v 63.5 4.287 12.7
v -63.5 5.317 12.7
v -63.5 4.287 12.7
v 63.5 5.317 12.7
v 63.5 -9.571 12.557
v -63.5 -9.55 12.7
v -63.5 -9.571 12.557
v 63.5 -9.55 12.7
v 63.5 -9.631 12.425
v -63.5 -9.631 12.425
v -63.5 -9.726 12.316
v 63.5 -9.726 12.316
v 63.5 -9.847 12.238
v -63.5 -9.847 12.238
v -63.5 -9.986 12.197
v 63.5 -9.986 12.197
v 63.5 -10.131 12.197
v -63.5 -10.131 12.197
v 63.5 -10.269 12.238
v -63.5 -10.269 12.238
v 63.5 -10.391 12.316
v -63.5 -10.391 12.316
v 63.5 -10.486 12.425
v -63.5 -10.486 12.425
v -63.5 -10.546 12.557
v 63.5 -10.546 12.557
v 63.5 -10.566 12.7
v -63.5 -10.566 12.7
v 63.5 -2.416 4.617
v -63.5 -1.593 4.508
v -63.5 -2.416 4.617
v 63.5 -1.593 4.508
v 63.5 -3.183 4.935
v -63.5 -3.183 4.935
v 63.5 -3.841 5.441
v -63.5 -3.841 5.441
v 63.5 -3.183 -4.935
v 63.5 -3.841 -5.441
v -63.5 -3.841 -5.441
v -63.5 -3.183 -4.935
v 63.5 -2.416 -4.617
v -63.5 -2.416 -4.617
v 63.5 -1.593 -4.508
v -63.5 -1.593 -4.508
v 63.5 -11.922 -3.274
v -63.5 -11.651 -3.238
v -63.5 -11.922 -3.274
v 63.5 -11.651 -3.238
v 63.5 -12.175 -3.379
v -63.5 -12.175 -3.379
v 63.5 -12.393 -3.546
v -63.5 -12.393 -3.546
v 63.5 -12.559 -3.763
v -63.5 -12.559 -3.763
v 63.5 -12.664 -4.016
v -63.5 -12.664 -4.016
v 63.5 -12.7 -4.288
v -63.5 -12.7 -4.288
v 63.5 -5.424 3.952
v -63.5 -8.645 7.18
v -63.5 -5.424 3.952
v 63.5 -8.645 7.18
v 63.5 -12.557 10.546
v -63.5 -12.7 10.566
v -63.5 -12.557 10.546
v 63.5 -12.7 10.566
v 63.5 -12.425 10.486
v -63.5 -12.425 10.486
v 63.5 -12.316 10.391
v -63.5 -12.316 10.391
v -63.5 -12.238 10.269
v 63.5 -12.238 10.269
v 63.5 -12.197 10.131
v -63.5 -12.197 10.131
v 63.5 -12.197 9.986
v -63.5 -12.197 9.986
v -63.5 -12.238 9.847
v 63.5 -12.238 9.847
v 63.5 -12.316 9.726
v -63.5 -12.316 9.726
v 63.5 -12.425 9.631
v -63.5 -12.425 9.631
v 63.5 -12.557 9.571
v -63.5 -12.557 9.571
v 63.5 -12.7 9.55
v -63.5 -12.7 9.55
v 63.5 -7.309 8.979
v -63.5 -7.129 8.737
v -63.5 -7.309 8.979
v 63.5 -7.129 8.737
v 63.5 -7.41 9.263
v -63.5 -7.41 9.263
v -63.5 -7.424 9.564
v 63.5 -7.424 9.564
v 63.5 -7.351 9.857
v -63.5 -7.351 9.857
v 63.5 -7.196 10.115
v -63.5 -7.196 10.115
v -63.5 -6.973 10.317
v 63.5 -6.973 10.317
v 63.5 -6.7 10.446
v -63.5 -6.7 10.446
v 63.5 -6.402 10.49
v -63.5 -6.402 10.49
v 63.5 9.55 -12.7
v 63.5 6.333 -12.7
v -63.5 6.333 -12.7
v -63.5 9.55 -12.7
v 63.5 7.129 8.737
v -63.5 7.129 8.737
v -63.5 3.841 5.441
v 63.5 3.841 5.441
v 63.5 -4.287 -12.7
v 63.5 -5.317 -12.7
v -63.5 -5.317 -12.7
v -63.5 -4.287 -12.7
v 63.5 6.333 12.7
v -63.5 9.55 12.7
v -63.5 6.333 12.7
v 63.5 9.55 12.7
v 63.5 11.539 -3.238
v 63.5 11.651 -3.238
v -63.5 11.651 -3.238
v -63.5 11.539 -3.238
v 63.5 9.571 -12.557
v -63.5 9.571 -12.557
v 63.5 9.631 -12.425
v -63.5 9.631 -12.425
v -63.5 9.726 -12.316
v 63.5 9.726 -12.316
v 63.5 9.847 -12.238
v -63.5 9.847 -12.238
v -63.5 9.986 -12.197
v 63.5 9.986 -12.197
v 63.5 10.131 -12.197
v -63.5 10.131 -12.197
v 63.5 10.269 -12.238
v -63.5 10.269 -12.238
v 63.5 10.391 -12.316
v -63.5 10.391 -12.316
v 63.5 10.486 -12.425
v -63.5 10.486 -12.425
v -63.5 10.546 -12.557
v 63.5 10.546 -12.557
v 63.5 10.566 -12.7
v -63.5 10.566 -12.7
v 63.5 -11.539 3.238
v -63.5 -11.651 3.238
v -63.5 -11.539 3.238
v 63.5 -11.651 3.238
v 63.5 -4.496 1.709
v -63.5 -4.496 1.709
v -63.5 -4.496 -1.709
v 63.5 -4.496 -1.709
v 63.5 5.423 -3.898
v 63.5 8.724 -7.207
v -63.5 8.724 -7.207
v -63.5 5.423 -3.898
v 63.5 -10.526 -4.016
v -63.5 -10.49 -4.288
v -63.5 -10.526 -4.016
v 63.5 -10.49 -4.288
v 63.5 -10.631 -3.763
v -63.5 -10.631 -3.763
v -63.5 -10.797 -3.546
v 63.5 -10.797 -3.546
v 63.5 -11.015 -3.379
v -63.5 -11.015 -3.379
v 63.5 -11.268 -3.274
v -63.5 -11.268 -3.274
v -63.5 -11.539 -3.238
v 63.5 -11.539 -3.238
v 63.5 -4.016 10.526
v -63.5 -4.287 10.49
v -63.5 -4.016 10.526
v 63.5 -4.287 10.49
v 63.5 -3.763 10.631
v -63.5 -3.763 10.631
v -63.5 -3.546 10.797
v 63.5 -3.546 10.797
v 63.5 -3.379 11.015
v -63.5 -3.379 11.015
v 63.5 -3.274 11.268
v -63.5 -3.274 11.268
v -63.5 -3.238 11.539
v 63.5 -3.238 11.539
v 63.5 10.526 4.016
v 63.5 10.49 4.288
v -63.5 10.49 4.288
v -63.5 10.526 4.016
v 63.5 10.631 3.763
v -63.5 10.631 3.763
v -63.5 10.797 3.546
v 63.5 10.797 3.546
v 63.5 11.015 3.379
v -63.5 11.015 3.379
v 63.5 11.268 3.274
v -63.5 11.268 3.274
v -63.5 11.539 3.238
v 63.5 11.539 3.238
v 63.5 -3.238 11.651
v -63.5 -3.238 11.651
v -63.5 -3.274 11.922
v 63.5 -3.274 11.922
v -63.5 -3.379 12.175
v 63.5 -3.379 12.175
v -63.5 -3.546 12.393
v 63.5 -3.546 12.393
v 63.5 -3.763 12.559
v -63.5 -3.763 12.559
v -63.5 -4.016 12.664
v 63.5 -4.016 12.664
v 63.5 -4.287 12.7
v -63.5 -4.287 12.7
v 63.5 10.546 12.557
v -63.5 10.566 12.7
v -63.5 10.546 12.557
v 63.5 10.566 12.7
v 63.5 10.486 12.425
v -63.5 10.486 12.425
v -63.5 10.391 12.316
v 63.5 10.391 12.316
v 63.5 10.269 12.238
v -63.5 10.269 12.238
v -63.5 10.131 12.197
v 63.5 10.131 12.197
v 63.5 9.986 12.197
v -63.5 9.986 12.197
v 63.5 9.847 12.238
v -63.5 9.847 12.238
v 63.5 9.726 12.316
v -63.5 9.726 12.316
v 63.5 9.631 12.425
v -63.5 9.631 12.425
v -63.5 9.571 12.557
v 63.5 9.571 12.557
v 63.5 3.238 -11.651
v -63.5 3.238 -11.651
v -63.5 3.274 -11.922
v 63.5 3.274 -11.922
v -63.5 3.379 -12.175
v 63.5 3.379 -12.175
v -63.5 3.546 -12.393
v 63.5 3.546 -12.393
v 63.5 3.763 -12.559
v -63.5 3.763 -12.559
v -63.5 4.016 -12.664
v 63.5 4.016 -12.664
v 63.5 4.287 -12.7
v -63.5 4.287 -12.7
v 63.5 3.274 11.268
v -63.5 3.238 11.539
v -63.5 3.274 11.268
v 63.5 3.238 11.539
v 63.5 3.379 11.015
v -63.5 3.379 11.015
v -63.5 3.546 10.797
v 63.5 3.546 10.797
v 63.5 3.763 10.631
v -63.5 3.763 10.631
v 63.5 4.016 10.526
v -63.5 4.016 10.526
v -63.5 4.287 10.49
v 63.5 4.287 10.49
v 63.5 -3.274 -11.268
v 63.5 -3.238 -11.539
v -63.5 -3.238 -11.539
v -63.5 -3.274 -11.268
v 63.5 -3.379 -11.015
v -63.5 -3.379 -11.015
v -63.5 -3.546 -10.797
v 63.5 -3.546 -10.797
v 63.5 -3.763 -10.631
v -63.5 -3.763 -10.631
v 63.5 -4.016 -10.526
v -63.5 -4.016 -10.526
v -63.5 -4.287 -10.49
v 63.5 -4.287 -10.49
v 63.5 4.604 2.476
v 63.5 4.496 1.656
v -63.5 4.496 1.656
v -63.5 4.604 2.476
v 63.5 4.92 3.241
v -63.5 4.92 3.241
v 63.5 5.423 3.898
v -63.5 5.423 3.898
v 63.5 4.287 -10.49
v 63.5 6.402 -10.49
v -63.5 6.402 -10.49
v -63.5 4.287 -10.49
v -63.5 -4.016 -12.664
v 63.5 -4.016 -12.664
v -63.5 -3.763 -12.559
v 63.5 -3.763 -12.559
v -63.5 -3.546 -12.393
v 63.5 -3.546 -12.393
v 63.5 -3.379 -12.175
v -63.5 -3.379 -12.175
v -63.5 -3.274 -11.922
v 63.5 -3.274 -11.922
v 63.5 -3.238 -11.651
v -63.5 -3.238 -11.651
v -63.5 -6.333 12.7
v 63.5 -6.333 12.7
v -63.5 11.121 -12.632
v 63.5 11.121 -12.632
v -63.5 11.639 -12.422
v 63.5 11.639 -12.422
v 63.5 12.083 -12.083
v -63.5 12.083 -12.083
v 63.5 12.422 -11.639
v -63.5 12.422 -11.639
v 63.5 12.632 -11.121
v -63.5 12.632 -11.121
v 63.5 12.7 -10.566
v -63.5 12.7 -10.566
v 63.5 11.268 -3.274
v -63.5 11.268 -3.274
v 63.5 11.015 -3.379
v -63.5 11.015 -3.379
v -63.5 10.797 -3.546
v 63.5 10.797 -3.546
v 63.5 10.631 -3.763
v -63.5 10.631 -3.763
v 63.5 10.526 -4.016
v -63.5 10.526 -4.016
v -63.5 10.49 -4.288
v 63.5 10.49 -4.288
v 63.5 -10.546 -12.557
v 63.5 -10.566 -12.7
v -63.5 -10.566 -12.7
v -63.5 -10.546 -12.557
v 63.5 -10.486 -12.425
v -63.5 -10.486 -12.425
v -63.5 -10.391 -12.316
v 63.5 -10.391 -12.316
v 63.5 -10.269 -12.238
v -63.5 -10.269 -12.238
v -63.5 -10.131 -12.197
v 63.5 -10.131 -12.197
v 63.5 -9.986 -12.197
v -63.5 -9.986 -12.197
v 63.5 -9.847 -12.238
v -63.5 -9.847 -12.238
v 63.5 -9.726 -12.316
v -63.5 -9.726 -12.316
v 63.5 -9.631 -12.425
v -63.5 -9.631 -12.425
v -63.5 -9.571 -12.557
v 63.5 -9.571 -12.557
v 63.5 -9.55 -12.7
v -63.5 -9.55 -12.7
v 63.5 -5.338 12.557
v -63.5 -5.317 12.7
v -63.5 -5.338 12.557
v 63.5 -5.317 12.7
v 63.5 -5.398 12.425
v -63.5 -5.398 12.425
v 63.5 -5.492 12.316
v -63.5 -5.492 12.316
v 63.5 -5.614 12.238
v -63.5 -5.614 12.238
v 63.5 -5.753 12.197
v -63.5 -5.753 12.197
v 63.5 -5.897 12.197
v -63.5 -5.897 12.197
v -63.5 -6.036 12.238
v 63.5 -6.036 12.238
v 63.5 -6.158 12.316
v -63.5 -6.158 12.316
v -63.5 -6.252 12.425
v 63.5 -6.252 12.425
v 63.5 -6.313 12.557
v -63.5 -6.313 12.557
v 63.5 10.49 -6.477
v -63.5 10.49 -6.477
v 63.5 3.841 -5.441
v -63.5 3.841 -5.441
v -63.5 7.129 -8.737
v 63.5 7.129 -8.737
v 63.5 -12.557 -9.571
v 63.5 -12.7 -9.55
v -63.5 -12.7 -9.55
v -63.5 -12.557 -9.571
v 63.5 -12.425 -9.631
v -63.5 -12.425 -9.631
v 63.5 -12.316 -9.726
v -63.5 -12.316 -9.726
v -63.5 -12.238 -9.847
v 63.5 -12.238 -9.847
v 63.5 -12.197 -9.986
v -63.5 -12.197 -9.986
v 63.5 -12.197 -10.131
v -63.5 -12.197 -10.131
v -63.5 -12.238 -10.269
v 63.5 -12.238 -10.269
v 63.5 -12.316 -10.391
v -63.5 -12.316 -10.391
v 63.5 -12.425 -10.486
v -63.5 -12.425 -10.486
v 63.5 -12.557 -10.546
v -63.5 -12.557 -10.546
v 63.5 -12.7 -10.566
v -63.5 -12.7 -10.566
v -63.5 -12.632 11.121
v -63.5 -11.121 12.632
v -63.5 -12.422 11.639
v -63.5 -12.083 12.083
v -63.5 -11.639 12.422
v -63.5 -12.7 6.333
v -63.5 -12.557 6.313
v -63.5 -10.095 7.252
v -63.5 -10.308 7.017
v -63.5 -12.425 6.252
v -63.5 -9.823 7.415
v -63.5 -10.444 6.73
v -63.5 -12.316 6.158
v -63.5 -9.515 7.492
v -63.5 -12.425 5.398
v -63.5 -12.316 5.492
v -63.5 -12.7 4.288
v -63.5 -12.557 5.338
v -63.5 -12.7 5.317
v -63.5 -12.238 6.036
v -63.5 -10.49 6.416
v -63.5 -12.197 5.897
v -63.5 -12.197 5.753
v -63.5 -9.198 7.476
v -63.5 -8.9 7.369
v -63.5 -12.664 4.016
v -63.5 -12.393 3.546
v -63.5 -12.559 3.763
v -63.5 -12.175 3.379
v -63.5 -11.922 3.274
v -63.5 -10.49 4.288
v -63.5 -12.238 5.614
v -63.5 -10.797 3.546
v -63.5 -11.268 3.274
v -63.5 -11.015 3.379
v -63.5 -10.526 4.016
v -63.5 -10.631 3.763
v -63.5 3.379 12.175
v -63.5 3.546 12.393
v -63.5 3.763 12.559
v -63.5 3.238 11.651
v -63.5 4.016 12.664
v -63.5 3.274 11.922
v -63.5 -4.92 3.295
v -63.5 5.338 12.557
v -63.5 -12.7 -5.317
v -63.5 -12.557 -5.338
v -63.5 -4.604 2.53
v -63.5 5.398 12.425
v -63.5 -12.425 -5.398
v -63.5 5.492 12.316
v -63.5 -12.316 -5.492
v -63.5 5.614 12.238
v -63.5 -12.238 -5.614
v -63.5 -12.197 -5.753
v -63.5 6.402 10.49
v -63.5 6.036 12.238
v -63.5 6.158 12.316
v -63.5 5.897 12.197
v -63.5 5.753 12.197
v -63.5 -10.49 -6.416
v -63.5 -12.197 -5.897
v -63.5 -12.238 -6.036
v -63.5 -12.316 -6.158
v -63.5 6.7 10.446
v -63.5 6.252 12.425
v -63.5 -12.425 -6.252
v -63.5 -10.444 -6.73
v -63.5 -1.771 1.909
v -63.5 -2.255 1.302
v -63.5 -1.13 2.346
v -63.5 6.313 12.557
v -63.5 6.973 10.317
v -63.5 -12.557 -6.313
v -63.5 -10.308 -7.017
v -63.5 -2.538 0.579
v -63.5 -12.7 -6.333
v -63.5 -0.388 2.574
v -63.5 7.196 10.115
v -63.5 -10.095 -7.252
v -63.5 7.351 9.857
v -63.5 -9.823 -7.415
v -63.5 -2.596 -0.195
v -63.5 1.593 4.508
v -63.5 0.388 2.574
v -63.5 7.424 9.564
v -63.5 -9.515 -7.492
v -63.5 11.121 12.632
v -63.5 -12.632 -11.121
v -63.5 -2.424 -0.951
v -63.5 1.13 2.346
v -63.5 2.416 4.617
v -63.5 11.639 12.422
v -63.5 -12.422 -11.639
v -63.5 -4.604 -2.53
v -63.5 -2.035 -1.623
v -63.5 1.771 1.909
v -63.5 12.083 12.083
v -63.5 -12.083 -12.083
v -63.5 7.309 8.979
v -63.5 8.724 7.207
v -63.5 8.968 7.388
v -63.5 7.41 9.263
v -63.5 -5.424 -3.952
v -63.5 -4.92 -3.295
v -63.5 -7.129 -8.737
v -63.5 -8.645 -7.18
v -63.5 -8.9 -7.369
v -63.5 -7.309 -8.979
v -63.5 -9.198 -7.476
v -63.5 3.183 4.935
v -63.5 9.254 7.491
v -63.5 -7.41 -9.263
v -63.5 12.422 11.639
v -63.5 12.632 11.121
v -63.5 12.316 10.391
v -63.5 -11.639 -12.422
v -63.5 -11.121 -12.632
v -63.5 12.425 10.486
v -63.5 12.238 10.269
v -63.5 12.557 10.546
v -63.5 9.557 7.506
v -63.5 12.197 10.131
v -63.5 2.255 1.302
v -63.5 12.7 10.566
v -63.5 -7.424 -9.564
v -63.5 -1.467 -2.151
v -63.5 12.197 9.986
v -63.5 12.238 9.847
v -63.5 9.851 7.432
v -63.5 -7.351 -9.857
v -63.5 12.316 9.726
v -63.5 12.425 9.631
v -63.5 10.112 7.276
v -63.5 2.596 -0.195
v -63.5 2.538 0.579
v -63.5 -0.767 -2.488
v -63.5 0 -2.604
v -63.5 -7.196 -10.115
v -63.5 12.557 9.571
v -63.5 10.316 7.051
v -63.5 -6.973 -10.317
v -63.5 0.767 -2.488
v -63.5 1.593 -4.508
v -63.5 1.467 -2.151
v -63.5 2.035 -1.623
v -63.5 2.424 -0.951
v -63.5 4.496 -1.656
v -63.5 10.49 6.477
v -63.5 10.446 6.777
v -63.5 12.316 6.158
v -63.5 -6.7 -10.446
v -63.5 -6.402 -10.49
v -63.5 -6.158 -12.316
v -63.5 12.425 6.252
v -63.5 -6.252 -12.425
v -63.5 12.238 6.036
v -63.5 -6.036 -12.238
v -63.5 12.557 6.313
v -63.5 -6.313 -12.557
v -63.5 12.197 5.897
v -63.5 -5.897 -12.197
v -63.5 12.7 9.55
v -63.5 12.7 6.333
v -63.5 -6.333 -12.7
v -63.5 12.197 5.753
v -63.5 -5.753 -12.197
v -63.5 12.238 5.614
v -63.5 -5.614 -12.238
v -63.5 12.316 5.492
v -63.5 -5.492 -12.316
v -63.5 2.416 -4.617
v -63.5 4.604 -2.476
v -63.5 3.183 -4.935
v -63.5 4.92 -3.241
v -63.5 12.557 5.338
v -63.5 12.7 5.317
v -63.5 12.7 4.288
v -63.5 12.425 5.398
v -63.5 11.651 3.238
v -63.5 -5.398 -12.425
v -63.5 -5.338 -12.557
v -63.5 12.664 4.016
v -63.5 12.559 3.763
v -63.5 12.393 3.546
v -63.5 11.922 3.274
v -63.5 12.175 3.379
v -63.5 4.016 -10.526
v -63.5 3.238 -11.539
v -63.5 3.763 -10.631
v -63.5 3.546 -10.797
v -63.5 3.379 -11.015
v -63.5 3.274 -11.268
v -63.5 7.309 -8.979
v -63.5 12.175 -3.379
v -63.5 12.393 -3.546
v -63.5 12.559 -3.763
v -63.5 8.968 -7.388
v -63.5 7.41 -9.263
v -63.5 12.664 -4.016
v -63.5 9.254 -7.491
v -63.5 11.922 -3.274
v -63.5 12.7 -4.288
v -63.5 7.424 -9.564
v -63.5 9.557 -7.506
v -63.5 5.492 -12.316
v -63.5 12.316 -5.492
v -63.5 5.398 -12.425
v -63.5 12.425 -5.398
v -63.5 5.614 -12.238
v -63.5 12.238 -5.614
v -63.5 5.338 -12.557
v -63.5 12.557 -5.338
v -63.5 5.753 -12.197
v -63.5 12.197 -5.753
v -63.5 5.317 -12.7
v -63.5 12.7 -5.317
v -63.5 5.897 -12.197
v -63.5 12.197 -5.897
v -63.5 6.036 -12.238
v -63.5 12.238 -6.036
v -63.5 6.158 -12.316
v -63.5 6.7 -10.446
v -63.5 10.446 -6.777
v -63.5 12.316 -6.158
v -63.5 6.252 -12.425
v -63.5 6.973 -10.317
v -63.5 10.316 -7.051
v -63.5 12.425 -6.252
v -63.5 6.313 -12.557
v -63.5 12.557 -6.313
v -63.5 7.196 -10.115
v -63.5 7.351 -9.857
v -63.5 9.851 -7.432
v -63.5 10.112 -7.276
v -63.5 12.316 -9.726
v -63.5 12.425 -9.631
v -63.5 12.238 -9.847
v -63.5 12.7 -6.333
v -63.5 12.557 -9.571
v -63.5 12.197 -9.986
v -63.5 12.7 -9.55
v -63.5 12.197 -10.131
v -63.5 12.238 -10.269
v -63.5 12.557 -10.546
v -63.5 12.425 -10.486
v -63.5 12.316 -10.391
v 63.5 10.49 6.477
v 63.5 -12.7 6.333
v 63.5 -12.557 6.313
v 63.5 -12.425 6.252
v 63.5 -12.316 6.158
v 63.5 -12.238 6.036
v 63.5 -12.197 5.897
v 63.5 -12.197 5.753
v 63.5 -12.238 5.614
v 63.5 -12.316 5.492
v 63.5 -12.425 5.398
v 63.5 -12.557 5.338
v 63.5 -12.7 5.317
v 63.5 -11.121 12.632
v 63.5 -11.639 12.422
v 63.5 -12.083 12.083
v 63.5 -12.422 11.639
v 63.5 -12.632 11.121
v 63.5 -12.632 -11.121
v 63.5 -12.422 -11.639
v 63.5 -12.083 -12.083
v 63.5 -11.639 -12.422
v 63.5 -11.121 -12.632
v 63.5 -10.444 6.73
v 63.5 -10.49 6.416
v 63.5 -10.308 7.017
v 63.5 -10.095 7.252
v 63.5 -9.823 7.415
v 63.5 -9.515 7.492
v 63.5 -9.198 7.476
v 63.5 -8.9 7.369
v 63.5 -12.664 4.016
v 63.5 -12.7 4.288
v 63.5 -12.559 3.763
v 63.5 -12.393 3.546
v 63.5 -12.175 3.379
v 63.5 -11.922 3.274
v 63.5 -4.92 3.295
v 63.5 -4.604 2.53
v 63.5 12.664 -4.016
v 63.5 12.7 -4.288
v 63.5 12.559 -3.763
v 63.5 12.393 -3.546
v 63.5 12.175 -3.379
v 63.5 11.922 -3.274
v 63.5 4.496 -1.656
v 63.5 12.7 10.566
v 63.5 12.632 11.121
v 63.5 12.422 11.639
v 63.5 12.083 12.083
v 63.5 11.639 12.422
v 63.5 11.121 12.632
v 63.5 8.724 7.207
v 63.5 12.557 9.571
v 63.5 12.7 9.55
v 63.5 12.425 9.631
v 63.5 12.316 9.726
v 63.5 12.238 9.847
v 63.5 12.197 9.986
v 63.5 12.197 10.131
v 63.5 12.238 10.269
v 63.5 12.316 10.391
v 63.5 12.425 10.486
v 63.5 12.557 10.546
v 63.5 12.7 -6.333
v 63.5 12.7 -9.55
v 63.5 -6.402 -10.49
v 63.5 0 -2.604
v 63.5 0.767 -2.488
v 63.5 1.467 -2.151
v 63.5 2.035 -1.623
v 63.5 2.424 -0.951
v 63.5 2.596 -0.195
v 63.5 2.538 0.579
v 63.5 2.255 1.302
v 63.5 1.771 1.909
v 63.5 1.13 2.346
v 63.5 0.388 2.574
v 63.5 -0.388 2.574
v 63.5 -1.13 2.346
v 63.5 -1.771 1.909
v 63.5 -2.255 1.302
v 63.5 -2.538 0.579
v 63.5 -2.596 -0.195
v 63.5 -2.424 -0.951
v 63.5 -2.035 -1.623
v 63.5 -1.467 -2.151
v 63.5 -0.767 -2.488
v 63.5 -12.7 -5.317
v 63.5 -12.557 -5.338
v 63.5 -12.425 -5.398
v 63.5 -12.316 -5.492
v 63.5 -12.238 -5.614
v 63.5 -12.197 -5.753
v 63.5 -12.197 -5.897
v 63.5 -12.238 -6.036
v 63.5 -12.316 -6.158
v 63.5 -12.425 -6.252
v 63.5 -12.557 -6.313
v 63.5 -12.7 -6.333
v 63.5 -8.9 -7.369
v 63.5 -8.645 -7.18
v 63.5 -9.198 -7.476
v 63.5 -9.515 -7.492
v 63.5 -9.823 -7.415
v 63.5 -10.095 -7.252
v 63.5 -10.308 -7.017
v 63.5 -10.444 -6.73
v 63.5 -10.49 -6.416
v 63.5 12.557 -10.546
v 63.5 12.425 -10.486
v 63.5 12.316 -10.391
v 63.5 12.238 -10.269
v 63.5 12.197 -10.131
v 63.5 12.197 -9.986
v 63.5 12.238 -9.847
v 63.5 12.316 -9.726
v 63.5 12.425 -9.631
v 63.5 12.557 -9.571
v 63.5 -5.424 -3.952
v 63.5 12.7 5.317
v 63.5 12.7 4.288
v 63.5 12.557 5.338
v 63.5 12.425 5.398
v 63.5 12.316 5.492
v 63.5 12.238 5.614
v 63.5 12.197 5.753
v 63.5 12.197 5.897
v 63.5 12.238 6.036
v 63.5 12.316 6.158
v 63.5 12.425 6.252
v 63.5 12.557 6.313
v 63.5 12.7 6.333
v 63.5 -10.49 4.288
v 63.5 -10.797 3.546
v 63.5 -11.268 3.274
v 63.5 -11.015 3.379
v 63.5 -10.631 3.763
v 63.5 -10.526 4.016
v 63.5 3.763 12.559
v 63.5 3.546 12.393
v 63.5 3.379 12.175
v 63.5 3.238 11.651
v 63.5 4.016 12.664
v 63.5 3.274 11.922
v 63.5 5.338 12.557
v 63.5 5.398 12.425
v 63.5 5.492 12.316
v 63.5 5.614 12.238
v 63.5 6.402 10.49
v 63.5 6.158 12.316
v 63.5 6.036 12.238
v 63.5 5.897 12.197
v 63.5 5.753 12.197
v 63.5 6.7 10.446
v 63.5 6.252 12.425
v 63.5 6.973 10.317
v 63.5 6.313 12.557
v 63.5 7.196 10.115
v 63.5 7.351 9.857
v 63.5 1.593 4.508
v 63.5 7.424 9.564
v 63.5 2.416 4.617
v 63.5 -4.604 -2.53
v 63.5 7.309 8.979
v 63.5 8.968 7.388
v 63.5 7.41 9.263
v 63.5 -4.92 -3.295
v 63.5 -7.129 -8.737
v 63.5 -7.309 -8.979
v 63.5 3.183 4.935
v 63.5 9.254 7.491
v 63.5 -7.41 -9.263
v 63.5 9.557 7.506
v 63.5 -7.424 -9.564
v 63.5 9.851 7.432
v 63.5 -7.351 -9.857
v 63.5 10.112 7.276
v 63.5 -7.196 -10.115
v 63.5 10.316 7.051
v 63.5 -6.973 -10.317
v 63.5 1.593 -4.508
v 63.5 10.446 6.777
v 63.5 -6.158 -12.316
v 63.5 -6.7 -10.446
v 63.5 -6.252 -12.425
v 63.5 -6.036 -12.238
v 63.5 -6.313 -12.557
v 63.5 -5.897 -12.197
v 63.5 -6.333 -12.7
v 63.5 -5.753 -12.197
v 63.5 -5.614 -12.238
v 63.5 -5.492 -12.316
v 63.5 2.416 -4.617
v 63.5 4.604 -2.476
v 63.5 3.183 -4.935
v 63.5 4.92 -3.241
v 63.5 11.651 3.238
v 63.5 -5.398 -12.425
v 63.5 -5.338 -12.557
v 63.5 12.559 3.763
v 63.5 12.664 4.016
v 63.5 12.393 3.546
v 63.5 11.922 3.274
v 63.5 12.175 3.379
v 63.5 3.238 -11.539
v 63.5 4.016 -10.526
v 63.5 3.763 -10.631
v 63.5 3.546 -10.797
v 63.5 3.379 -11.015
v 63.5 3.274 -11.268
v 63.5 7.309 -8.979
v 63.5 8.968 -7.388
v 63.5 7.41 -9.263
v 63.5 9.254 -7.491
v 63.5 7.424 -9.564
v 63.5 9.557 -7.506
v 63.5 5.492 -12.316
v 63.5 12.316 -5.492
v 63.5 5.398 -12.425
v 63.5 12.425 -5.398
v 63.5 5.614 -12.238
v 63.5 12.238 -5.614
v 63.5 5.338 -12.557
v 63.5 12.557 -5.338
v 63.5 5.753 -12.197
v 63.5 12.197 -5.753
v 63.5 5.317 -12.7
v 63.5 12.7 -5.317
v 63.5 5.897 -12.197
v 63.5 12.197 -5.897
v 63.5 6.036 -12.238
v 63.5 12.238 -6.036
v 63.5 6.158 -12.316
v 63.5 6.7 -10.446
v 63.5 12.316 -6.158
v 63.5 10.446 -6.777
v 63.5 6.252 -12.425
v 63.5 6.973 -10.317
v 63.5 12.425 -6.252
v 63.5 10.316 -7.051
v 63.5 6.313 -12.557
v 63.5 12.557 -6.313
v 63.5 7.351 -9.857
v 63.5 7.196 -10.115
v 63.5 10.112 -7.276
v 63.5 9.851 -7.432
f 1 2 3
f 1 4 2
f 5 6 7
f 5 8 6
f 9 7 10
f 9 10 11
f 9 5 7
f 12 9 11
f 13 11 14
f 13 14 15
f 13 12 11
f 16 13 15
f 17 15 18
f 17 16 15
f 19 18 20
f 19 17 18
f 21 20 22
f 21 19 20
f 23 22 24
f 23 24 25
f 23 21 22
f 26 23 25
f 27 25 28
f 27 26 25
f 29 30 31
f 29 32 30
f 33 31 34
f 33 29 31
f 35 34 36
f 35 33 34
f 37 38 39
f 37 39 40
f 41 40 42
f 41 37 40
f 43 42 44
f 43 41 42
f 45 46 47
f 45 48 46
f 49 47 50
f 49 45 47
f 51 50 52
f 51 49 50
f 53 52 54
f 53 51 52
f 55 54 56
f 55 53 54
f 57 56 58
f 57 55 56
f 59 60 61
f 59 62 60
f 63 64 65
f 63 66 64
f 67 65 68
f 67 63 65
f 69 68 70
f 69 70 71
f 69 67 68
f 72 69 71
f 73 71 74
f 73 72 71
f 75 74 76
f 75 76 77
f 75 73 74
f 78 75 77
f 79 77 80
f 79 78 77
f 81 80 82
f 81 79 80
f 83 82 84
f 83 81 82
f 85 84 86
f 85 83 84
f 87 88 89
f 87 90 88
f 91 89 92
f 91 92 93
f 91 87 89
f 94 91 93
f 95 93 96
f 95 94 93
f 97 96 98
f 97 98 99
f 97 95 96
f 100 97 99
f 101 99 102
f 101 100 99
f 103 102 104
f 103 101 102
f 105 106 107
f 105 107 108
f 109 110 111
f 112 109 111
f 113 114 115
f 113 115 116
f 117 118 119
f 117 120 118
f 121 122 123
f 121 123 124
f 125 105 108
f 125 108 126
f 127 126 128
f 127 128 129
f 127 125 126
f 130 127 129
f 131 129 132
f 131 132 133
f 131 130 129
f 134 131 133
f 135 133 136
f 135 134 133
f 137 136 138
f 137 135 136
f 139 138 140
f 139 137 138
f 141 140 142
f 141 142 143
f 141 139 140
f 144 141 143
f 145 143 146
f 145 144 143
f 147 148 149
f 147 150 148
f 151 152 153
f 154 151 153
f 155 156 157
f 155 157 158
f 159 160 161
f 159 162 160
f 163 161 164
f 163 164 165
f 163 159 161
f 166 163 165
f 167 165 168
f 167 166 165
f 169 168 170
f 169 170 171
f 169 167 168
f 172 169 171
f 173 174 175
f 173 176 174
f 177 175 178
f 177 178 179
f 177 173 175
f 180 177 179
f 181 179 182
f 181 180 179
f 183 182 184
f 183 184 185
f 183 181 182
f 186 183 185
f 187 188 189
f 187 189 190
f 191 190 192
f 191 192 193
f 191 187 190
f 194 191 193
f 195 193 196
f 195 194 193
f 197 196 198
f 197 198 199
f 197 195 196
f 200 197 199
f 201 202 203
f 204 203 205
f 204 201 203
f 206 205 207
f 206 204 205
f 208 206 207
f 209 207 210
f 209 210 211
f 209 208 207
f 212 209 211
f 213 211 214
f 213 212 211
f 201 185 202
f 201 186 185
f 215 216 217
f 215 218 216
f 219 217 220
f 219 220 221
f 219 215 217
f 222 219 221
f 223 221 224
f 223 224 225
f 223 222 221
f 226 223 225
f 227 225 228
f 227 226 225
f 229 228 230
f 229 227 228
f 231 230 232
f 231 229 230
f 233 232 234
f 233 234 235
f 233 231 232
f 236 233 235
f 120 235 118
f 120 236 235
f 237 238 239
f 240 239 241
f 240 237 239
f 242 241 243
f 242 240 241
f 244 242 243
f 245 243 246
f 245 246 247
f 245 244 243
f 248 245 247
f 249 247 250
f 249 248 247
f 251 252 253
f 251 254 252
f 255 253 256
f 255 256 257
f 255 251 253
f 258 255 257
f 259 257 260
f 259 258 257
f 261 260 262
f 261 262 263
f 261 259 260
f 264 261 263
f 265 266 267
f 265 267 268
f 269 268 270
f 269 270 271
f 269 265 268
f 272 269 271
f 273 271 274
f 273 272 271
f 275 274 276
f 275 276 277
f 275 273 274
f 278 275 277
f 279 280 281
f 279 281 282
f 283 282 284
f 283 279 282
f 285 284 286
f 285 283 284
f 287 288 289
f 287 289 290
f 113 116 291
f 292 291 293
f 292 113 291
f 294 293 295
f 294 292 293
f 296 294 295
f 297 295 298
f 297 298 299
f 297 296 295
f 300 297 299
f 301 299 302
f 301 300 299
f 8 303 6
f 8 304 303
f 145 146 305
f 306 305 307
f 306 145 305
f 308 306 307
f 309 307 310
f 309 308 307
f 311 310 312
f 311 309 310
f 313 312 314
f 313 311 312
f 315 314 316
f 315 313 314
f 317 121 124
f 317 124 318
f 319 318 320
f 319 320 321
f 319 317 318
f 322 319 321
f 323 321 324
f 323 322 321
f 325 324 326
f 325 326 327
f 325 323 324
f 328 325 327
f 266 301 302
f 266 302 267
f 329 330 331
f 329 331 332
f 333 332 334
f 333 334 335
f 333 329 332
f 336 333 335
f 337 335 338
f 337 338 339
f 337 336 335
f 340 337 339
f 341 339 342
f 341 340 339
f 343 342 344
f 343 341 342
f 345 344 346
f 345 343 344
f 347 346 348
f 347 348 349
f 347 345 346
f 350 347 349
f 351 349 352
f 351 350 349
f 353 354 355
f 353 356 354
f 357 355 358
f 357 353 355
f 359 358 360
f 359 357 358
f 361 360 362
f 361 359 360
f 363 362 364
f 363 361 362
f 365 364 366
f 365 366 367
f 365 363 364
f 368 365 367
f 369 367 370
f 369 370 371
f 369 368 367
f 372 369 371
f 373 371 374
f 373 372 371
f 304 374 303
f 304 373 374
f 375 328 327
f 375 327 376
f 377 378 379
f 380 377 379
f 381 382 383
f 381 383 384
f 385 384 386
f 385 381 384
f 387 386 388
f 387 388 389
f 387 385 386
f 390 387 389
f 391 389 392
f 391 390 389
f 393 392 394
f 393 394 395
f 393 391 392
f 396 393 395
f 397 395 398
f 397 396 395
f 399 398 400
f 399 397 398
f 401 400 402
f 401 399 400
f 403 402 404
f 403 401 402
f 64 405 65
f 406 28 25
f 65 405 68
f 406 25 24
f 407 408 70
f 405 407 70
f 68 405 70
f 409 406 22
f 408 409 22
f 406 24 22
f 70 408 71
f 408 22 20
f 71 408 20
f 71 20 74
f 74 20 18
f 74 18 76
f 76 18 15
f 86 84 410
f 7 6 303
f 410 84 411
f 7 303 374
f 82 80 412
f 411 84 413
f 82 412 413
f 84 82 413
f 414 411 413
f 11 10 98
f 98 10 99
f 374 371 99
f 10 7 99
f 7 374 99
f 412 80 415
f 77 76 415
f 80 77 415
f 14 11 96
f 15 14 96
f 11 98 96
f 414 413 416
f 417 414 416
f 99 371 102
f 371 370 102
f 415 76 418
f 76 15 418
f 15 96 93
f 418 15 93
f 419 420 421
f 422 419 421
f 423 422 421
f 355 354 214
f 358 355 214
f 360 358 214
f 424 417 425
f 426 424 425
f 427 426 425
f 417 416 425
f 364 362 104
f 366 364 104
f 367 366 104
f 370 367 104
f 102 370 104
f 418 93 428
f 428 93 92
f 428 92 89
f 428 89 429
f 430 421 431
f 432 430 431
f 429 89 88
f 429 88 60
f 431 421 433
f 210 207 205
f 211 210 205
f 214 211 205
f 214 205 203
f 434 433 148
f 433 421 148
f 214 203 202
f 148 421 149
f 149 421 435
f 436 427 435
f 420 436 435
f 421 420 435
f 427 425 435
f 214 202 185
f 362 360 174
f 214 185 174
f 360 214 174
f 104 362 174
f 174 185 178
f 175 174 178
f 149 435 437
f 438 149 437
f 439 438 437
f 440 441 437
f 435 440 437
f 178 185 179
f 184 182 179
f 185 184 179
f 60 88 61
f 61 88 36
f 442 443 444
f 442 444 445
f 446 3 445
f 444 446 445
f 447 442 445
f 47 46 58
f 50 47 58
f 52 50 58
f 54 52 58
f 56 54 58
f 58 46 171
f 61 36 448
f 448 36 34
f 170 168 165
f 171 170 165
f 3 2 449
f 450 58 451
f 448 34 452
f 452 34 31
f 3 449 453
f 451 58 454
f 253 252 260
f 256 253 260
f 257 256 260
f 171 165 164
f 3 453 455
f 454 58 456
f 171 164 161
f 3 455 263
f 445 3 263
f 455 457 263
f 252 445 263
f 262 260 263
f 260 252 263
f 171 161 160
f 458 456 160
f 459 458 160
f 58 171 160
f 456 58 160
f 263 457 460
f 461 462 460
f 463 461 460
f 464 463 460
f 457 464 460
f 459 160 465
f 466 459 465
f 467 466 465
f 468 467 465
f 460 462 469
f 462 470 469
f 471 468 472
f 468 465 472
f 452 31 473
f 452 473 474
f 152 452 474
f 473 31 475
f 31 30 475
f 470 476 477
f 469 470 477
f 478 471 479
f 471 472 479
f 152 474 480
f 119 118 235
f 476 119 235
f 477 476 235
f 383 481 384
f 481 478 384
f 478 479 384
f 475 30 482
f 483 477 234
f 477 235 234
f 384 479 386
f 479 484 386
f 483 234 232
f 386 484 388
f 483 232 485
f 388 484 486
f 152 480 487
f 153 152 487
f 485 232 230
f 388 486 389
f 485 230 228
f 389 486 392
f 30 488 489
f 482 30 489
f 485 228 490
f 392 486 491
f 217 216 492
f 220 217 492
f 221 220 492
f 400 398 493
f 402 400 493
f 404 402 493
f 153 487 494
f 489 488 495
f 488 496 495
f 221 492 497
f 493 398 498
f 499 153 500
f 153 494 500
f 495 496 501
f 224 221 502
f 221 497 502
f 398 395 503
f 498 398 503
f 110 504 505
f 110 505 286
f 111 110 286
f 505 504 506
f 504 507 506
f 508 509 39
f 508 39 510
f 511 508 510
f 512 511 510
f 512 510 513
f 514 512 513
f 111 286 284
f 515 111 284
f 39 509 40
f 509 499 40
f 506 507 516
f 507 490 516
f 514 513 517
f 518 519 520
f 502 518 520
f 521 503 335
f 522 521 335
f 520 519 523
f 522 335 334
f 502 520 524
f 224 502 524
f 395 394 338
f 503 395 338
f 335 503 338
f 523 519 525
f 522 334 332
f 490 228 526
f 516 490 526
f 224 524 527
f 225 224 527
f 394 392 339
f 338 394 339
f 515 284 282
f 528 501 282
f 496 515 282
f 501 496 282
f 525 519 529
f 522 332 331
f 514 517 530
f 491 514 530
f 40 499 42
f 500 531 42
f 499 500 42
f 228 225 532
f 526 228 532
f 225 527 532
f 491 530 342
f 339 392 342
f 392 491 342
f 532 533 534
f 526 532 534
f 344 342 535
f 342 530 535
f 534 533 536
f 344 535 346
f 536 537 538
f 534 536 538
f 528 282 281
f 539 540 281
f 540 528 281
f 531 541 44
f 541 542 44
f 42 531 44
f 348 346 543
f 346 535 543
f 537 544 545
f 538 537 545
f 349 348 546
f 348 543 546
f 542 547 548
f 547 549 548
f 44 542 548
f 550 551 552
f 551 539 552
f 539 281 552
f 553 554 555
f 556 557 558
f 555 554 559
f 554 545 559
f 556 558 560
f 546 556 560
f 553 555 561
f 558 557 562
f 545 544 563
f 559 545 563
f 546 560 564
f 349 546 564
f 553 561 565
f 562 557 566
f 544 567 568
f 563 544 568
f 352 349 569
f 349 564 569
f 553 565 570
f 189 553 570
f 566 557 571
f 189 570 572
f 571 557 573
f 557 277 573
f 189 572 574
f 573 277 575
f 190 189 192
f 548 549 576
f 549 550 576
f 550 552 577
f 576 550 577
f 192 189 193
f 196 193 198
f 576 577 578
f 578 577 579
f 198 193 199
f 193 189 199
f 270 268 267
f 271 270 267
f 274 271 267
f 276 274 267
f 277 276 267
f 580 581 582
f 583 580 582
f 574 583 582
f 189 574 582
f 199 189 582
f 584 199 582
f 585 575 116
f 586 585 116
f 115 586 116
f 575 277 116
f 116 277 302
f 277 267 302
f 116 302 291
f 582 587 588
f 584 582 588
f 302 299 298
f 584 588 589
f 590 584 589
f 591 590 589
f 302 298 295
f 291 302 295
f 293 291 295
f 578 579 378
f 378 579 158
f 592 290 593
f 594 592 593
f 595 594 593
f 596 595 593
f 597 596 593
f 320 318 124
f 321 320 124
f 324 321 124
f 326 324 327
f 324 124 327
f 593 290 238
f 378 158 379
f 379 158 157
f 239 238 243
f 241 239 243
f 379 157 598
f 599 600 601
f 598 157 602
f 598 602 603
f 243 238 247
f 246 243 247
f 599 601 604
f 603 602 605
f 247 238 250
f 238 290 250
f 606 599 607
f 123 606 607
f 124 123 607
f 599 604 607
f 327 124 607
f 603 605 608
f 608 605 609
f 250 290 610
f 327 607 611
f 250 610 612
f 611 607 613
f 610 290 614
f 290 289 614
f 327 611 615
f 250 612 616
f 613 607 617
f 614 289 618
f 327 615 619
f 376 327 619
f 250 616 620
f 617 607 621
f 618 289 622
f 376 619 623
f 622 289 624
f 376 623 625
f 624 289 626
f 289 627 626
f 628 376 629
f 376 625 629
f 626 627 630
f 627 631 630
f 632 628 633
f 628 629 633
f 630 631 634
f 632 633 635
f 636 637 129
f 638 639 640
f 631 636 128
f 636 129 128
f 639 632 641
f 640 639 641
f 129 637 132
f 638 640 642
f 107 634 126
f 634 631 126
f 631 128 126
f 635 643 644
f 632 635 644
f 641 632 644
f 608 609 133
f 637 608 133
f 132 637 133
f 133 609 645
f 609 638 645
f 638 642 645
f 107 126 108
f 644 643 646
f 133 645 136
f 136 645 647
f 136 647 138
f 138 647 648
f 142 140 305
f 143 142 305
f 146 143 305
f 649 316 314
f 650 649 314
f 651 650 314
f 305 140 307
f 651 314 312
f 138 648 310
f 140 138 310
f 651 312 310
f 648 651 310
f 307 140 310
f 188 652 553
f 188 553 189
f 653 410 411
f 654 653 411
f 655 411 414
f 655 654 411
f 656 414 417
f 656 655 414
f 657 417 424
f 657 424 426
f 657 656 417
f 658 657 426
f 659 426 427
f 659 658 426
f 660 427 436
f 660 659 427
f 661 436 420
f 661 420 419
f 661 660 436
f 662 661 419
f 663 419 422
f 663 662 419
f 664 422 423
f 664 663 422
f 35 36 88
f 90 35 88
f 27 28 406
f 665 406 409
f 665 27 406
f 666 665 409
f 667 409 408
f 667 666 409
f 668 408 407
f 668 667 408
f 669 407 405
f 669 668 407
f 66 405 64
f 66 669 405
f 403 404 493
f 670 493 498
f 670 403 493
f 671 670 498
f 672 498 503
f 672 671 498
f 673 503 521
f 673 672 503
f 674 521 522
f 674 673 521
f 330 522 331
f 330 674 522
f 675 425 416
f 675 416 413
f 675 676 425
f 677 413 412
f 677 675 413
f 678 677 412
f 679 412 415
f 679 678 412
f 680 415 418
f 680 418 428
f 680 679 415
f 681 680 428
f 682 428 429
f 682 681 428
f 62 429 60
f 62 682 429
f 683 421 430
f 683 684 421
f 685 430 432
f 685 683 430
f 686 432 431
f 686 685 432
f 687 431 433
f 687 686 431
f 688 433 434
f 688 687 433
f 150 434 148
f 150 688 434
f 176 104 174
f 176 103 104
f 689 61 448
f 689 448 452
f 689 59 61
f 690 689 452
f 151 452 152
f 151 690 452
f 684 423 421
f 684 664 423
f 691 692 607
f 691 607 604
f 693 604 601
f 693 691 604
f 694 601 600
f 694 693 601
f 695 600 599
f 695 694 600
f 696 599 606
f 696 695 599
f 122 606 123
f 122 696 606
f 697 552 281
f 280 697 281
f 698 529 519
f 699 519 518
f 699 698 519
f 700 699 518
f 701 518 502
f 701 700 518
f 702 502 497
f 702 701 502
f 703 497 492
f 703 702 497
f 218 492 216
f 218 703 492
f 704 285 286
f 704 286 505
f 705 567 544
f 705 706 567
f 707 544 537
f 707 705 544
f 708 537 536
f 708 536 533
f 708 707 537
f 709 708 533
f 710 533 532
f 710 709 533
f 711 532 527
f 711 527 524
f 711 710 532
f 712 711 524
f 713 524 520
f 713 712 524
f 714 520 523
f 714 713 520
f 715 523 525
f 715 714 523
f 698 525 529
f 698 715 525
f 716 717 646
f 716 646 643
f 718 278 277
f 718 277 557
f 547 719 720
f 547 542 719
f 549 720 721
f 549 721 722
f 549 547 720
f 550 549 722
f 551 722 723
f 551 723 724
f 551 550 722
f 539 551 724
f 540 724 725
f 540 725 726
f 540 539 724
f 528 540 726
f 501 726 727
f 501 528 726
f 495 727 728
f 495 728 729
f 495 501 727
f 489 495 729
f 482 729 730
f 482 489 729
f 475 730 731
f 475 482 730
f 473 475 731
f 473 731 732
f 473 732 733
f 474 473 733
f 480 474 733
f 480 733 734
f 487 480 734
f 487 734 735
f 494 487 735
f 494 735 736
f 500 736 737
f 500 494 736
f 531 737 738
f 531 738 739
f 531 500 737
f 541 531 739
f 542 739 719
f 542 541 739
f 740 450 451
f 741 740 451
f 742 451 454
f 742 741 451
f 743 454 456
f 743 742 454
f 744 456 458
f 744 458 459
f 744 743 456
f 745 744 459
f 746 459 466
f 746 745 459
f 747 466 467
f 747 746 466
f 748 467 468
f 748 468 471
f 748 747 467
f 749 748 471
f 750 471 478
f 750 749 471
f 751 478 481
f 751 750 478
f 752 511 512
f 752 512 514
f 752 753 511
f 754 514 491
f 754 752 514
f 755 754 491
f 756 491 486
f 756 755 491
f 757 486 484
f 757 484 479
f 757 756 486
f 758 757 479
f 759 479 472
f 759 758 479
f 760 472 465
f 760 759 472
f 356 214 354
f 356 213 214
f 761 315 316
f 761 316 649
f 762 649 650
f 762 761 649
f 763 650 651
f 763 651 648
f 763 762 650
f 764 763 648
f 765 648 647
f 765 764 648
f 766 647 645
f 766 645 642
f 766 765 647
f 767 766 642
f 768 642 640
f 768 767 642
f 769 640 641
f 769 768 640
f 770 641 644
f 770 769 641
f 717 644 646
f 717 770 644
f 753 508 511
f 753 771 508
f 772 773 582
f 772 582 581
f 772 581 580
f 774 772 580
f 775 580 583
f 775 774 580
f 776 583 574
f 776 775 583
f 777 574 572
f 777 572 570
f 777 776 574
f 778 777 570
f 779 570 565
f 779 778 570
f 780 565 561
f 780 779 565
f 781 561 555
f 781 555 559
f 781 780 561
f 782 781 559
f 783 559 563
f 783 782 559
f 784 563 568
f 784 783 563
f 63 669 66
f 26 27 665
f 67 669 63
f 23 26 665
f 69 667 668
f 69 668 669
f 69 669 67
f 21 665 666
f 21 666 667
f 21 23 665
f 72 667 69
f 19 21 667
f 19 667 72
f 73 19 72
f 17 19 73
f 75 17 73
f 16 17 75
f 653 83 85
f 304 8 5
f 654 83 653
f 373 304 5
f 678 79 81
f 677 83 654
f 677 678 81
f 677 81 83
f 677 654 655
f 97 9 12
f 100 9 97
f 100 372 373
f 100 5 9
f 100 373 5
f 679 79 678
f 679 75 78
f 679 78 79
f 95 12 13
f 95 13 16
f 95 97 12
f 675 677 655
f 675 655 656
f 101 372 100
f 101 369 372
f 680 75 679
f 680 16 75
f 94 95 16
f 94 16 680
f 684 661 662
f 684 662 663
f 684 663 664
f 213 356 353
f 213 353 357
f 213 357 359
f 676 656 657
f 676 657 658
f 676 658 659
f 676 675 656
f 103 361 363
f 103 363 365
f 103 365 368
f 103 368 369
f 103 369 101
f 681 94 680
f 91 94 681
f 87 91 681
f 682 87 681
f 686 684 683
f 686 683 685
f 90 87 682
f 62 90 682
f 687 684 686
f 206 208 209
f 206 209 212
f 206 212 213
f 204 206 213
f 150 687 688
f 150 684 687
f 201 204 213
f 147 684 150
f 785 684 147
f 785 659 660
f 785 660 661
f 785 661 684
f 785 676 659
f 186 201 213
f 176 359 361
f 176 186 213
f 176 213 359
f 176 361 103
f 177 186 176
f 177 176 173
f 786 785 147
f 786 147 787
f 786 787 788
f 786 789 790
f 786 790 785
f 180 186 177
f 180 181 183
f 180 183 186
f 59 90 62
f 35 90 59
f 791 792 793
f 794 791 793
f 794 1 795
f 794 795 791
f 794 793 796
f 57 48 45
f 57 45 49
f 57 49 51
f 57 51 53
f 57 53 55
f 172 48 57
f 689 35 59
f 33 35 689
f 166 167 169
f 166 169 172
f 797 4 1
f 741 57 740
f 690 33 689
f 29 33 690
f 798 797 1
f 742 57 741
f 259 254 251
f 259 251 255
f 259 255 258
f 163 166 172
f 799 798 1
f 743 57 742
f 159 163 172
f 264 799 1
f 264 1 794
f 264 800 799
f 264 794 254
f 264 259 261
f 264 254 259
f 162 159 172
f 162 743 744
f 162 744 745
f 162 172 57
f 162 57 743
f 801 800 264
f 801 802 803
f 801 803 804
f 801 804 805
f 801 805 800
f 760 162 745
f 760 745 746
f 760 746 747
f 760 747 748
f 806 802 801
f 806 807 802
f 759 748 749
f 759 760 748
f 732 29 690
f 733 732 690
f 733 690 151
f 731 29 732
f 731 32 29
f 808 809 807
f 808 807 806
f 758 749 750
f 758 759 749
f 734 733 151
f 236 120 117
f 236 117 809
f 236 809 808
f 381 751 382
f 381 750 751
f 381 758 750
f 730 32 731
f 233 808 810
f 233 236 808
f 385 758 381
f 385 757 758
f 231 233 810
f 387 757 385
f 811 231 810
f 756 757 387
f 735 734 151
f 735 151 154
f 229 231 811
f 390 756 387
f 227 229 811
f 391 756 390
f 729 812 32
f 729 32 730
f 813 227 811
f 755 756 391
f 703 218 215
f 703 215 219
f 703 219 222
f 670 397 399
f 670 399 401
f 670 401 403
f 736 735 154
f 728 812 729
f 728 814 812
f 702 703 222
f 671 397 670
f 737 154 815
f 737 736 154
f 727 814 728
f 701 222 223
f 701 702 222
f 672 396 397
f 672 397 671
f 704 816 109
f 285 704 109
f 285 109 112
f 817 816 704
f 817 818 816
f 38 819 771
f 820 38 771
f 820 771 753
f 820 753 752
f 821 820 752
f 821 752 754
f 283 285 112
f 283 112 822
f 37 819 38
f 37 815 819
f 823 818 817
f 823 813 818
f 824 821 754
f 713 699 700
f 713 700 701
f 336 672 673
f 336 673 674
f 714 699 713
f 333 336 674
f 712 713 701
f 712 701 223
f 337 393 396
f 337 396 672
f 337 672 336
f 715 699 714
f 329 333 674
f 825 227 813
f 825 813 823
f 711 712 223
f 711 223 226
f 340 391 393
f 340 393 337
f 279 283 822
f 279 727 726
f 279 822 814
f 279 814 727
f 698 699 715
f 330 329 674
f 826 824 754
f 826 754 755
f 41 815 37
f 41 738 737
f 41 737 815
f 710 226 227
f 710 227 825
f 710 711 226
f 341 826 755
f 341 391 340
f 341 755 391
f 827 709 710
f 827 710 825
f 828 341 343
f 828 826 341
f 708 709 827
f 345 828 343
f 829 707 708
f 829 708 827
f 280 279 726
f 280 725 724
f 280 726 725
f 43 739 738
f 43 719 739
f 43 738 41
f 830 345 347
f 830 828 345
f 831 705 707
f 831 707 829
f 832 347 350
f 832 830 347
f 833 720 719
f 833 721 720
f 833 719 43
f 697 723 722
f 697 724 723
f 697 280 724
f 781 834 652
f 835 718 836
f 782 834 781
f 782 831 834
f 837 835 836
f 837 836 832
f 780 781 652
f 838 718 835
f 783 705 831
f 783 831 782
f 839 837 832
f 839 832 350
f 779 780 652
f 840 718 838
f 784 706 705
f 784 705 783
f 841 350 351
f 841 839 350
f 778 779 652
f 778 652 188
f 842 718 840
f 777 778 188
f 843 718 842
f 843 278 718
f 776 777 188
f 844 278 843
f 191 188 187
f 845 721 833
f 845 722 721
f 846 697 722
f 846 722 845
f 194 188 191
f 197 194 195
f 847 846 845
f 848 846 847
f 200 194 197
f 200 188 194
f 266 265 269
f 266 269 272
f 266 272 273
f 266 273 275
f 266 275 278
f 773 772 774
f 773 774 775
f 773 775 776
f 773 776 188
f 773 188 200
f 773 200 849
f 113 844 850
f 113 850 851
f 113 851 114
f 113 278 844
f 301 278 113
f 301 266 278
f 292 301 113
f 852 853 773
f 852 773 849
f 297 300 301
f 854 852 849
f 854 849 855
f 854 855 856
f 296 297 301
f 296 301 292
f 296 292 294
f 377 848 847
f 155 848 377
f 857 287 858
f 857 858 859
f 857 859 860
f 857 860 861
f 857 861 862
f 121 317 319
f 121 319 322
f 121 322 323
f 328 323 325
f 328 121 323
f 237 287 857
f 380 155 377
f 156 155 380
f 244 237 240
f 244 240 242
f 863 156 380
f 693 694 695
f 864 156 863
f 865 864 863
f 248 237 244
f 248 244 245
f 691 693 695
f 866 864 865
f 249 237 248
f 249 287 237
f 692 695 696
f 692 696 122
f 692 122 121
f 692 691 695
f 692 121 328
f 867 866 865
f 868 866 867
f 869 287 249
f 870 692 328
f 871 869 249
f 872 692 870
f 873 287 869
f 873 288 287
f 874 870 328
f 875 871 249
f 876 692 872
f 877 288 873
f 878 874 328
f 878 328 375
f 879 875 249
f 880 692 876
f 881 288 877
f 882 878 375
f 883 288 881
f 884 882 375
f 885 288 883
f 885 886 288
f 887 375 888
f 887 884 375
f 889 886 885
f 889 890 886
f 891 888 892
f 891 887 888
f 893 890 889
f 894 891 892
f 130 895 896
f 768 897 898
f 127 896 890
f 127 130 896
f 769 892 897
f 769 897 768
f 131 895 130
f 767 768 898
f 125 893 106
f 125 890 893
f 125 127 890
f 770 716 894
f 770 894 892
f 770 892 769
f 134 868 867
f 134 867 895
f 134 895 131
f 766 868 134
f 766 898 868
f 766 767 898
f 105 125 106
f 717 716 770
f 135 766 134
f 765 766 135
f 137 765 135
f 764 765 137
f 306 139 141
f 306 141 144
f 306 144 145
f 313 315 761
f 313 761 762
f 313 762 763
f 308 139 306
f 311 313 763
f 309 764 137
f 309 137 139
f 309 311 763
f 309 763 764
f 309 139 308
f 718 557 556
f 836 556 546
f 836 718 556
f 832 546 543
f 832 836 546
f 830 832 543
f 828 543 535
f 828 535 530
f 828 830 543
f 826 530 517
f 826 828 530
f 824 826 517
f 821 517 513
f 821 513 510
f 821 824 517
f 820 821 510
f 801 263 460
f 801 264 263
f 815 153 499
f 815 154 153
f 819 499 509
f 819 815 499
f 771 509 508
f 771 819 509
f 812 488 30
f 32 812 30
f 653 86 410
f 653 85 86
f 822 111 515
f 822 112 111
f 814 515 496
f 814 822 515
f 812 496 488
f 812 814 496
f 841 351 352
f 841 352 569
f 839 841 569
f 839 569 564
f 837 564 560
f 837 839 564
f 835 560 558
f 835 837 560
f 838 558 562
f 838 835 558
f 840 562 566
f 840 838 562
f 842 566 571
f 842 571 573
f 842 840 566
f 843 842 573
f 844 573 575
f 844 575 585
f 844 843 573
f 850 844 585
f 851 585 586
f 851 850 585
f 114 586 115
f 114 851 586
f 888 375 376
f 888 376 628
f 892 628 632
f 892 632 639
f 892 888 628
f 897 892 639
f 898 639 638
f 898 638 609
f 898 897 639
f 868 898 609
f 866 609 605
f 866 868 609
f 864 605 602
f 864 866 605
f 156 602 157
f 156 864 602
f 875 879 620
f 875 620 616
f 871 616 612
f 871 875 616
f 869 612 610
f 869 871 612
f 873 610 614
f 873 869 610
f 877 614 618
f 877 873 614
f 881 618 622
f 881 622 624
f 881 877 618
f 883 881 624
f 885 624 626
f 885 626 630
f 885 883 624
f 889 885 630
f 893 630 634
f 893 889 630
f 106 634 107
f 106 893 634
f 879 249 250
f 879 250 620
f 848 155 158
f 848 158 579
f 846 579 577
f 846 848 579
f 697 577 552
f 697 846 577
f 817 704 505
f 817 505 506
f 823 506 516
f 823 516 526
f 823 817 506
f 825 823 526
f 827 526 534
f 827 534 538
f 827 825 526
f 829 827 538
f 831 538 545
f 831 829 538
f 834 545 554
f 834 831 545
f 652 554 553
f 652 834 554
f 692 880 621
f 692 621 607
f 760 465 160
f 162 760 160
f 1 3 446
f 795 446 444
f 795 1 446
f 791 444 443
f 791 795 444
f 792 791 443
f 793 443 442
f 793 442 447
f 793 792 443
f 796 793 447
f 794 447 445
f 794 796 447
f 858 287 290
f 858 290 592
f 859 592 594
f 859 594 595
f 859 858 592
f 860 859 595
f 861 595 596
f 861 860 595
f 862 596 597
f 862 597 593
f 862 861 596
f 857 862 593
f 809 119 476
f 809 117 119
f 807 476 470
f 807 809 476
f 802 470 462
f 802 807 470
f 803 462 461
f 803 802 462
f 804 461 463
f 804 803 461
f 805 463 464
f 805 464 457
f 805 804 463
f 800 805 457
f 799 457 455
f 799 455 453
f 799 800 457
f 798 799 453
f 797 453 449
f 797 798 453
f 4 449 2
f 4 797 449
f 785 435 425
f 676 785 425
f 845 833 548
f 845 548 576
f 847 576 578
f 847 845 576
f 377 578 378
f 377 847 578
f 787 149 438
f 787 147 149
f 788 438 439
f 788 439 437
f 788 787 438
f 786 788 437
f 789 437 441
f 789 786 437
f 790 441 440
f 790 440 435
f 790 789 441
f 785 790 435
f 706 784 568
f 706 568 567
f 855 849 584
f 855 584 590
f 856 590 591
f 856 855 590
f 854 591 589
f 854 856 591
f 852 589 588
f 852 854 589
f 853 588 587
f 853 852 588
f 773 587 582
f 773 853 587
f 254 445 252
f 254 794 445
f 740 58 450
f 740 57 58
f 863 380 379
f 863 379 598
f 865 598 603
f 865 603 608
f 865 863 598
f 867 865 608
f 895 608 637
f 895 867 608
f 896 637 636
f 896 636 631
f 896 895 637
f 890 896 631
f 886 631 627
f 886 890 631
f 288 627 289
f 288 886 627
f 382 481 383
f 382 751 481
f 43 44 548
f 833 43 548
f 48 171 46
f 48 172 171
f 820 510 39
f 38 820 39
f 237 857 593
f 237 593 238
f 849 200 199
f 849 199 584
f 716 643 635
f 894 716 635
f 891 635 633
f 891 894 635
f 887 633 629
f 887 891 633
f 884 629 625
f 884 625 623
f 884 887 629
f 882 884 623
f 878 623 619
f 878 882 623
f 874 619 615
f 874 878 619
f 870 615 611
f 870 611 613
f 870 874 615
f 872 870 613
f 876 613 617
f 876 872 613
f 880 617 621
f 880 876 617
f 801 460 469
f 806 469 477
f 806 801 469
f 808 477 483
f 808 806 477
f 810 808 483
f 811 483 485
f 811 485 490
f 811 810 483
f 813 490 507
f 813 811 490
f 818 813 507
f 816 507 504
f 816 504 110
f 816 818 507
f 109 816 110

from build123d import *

# Parameters (mm, degrees)
SKETCH1_R           = 2.6035
BOSS_EXTRUDE1_DEPTH = 63.5


with BuildPart() as part:
    # Sketch1 → Boss-Extrude1 (new body, symmetric)
    with BuildSketch(Plane(origin=(0, 0, 0), x_dir=(0, 0, -1), z_dir=(1, 0, 0))):
        with BuildLine():
            Line((6.333126718, -12.7), (9.550443118, -12.7))
            ThreePointArc((9.550443118, -12.7), (10.058366869, -12.192000006), (10.566443095, -12.699847501))
            ThreePointArc((10.566443095, -12.699847501), (12.082537762, -12.08250727), (12.699846982, -10.566399977))
            ThreePointArc((12.699846982, -10.566399977), (12.192000006, -10.058323491), (12.7, -9.5504))
            Line((12.7, -9.5504), (12.7, -6.3330836))
            ThreePointArc((12.7, -6.3330836), (12.192, -5.8250836), (12.7, -5.3170836))
            Line((12.7, -5.3170836), (12.7, -4.287469289))
            ThreePointArc((12.7, -4.287469289), (12.39275138, -3.545705502), (11.650987593, -3.238456882))
            Line((11.650987593, -3.238456882), (11.539212407, -3.238456882))
            ThreePointArc((11.539212407, -3.238456882), (10.79744862, -3.545705502), (10.4902, -4.287469289))
            Line((10.4902, -4.287469289), (10.4902, -6.402089023))
            ThreePointArc((10.4902, -6.402089023), (9.856505071, -7.351067942), (8.737131347, -7.129408934))
            Line((8.737131347, -7.129408934), (5.441005833, -3.840816462))
            ThreePointArc((5.441005833, -3.840816462), (4.750877967, -2.809883091), (4.5085, -1.593185507))
            Line((4.5085, -1.593185507), (4.5085, 1.593185507))
            ThreePointArc((4.5085, 1.593185507), (4.750877967, 2.809883091), (5.441005833, 3.840816462))
            Line((5.441005833, 3.840816462), (8.737131347, 7.129408934))
            ThreePointArc((8.737131347, 7.129408934), (9.856505071, 7.351067942), (10.4902, 6.402089023))
            Line((10.4902, 6.402089023), (10.4902, 4.287469289))
            ThreePointArc((10.4902, 4.287469289), (10.79744862, 3.545705502), (11.539212407, 3.238456882))
            Line((11.539212407, 3.238456882), (11.650987593, 3.238456882))
            ThreePointArc((11.650987593, 3.238456882), (12.39275138, 3.545705502), (12.7, 4.287469289))
            Line((12.7, 4.287469289), (12.7, 5.3170836))
            ThreePointArc((12.7, 5.3170836), (12.192, 5.8250836), (12.7, 6.3330836))
            Line((12.7, 6.3330836), (12.7, 9.5504))
            ThreePointArc((12.7, 9.5504), (12.192000006, 10.058323491), (12.699846982, 10.566399977))
            ThreePointArc((12.699846982, 10.566399977), (12.082537762, 12.08250727), (10.566443095, 12.699847501))
            ThreePointArc((10.566443095, 12.699847501), (10.058366869, 12.192000006), (9.550443118, 12.7))
            Line((9.550443118, 12.7), (6.333126718, 12.7))
            ThreePointArc((6.333126718, 12.7), (5.825126718, 12.192), (5.317126718, 12.7))
            Line((5.317126718, 12.7), (4.287512407, 12.7))
            ThreePointArc((4.287512407, 12.7), (3.54574862, 12.39275138), (3.2385, 11.650987593))
            Line((3.2385, 11.650987593), (3.2385, 11.539212407))
            ThreePointArc((3.2385, 11.539212407), (3.54574862, 10.79744862), (4.287512407, 10.4902))
            Line((4.287512407, 10.4902), (6.476788598, 10.4902))
            ThreePointArc((6.476788598, 10.4902), (7.432222385, 9.85140422), (7.207036008, 8.724370562))
            Line((7.207036008, 8.724370562), (3.898272566, 5.423169045))
            ThreePointArc((3.898272566, 5.423169045), (2.869120213, 4.736787962), (1.655778399, 4.4958))
            Line((1.655778399, 4.4958), (-1.655778399, 4.4958))
            ThreePointArc((-1.655778399, 4.4958), (-2.869120213, 4.736787962), (-3.898272566, 5.423169045))
            Line((-3.898272566, 5.423169045), (-7.207036008, 8.724370562))
            ThreePointArc((-7.207036008, 8.724370562), (-7.432222385, 9.85140422), (-6.476788598, 10.4902))
            Line((-6.476788598, 10.4902), (-4.287512407, 10.4902))
            ThreePointArc((-4.287512407, 10.4902), (-3.54574862, 10.79744862), (-3.2385, 11.539212407))
            Line((-3.2385, 11.539212407), (-3.2385, 11.650987593))
            ThreePointArc((-3.2385, 11.650987593), (-3.54574862, 12.39275138), (-4.287512407, 12.7))
            Line((-4.287512407, 12.7), (-5.317126718, 12.7))
            ThreePointArc((-5.317126718, 12.7), (-5.825126718, 12.192), (-6.333126718, 12.7))
            Line((-6.333126718, 12.7), (-9.550443118, 12.7))
            ThreePointArc((-9.550443118, 12.7), (-10.058366869, 12.192000006), (-10.566443095, 12.699847501))
            ThreePointArc((-10.566443095, 12.699847501), (-12.082537762, 12.08250727), (-12.699846982, 10.566399977))
            ThreePointArc((-12.699846982, 10.566399977), (-12.192000006, 10.058323491), (-12.7, 9.5504))
            Line((-12.7, 9.5504), (-12.7, 6.3330836))
            ThreePointArc((-12.7, 6.3330836), (-12.192, 5.8250836), (-12.7, 5.3170836))
            Line((-12.7, 5.3170836), (-12.7, 4.287469289))
            ThreePointArc((-12.7, 4.287469289), (-12.39275138, 3.545705502), (-11.650987593, 3.238456882))
            Line((-11.650987593, 3.238456882), (-11.539212407, 3.238456882))
            ThreePointArc((-11.539212407, 3.238456882), (-10.79744862, 3.545705502), (-10.4902, 4.287469289))
            Line((-10.4902, 4.287469289), (-10.4902, 6.402089023))
            ThreePointArc((-10.4902, 6.402089023), (-9.856505071, 7.351067942), (-8.737131347, 7.129408934))
            Line((-8.737131347, 7.129408934), (-5.441005833, 3.840816462))
            ThreePointArc((-5.441005833, 3.840816462), (-4.750877967, 2.809883091), (-4.5085, 1.593185507))
            Line((-4.5085, 1.593185507), (-4.5085, -1.593185507))
            ThreePointArc((-4.5085, -1.593185507), (-4.750877967, -2.809883091), (-5.441005833, -3.840816462))
            Line((-5.441005833, -3.840816462), (-8.737131347, -7.129408934))
            ThreePointArc((-8.737131347, -7.129408934), (-9.856505071, -7.351067942), (-10.4902, -6.402089023))
            Line((-10.4902, -6.402089023), (-10.4902, -4.287469289))
            ThreePointArc((-10.4902, -4.287469289), (-10.79744862, -3.545705502), (-11.539212407, -3.238456882))
            Line((-11.539212407, -3.238456882), (-11.650987593, -3.238456882))
            ThreePointArc((-11.650987593, -3.238456882), (-12.39275138, -3.545705502), (-12.7, -4.287469289))
            Line((-12.7, -4.287469289), (-12.7, -5.3170836))
            ThreePointArc((-12.7, -5.3170836), (-12.192, -5.8250836), (-12.7, -6.3330836))
            Line((-12.7, -6.3330836), (-12.7, -9.5504))
            ThreePointArc((-12.7, -9.5504), (-12.192000006, -10.058323491), (-12.699846982, -10.566399977))
            ThreePointArc((-12.699846982, -10.566399977), (-12.082537762, -12.08250727), (-10.566443095, -12.699847501))
            ThreePointArc((-10.566443095, -12.699847501), (-10.058366869, -12.192000006), (-9.550443118, -12.7))
            Line((-9.550443118, -12.7), (-6.333126718, -12.7))
            ThreePointArc((-6.333126718, -12.7), (-5.825126718, -12.192), (-5.317126718, -12.7))
            Line((-5.317126718, -12.7), (-4.287512407, -12.7))
            ThreePointArc((-4.287512407, -12.7), (-3.54574862, -12.39275138), (-3.2385, -11.650987593))
            Line((-3.2385, -11.650987593), (-3.2385, -11.539212407))
            ThreePointArc((-3.2385, -11.539212407), (-3.54574862, -10.79744862), (-4.287512407, -10.4902))
            Line((-4.287512407, -10.4902), (-6.416408329, -10.4902))
            ThreePointArc((-6.416408329, -10.4902), (-7.41473083, -9.822813117), (-7.179650497, -8.645192506))
            Line((-7.179650497, -8.645192506), (-3.952270251, -5.423690499))
            ThreePointArc((-3.952270251, -5.423690499), (-2.922936451, -4.736929036), (-1.709253557, -4.4958))
            Line((-1.709253557, -4.4958), (1.709253557, -4.4958))
            ThreePointArc((1.709253557, -4.4958), (2.922936451, -4.736929036), (3.952270251, -5.423690499))
            Line((3.952270251, -5.423690499), (7.179650497, -8.645192506))
            ThreePointArc((7.179650497, -8.645192506), (7.41473083, -9.822813117), (6.416408329, -10.4902))
            Line((6.416408329, -10.4902), (4.287512407, -10.4902))
            ThreePointArc((4.287512407, -10.4902), (3.54574862, -10.79744862), (3.2385, -11.539212407))
            Line((3.2385, -11.539212407), (3.2385, -11.650987593))
            ThreePointArc((3.2385, -11.650987593), (3.54574862, -12.39275138), (4.287512407, -12.7))
            Line((4.287512407, -12.7), (5.317126718, -12.7))
            ThreePointArc((5.317126718, -12.7), (5.825126718, -12.192), (6.333126718, -12.7))
        make_face()
        Circle(SKETCH1_R, mode=Mode.SUBTRACT)
    extrude(amount=BOSS_EXTRUDE1_DEPTH, both=True)


solid = part.part
